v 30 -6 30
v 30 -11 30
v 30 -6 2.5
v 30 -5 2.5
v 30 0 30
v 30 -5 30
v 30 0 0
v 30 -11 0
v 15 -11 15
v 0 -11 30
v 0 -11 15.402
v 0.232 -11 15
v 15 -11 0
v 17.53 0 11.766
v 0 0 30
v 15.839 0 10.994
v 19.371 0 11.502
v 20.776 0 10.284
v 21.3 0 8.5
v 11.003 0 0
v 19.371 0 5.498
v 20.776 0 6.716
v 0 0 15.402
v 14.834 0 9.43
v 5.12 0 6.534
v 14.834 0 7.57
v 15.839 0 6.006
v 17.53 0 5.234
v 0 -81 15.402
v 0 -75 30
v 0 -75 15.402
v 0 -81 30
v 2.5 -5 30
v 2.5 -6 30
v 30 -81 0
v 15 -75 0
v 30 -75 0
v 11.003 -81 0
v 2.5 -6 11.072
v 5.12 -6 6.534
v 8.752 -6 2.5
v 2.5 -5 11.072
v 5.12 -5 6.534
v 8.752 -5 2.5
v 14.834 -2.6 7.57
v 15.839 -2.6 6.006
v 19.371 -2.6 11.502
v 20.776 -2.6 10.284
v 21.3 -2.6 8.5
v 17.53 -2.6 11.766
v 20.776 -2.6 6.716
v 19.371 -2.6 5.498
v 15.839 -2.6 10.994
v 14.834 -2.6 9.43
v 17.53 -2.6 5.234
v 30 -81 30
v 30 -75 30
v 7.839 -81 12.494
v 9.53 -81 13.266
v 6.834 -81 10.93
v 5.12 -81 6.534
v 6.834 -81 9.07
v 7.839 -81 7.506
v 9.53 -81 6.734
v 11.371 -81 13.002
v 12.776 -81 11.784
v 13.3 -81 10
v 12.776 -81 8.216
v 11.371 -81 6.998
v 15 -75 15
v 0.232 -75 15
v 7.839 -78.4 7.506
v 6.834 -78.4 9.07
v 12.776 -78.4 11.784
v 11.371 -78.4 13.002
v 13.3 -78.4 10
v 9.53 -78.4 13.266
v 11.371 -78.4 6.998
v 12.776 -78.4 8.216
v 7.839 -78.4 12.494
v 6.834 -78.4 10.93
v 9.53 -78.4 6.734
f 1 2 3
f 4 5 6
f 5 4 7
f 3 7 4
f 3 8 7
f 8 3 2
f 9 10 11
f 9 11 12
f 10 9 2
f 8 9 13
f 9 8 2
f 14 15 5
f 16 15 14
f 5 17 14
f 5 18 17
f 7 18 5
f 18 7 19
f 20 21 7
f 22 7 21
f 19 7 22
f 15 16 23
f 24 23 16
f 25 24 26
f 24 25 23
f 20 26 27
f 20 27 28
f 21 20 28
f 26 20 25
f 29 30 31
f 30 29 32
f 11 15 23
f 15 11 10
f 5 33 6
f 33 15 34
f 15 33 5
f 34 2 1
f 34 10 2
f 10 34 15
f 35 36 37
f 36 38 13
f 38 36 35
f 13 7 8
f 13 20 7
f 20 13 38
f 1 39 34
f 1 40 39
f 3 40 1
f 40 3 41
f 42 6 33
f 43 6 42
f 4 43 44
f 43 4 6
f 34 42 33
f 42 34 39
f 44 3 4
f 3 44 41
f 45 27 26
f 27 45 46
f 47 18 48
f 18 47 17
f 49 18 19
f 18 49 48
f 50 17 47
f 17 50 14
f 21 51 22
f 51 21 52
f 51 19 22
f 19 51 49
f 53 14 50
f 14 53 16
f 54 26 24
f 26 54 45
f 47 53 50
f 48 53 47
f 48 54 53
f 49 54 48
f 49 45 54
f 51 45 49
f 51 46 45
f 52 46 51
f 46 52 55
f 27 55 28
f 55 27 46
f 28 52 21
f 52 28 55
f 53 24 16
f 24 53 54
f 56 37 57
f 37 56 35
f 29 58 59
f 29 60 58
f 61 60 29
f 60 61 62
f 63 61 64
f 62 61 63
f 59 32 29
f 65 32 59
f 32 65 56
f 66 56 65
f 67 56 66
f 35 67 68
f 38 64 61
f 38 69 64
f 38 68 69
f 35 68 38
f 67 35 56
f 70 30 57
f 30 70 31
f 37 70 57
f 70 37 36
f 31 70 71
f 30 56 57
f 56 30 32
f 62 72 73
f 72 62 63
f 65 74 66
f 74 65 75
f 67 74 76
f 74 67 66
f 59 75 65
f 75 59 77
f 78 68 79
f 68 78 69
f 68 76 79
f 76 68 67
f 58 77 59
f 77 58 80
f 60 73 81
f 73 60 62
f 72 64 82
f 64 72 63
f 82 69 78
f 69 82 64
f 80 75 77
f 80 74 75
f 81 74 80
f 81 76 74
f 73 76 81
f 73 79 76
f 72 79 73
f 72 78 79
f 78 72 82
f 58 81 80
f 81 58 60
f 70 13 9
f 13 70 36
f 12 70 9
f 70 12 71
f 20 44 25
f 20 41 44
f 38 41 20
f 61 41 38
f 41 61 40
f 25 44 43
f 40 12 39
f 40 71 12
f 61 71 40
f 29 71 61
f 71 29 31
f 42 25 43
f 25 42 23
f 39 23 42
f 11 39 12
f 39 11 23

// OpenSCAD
edge=30;
slot=1;
margin=2.5;

thickness=5;
height=80;

pillar_thickness=15;
pillar_height=height-3*thickness -slot;

magnet_radius=3.3;
magnet_thickness=2.6;

rotate([90,0,0]) {
    intersection() {
    union(){
        // base with slot for metal plate
        difference() {
            cube([edge,edge, 2 * thickness + slot]);
            translate([margin,margin,thickness]) cube([edge+2,edge+1,slot]);
            
            // bottom magnet hole, uncomment to change orientation. you need two of each
            //translate([8.5, 18, -1 ]) cylinder(r=magnet_radius, h=magnet_thickness+1);
            translate([18, 8.5, -1 ]) cylinder(r=magnet_radius, h=magnet_thickness+1);
        }
        
        // pillar
        translate([0, 0, 2*thickness+slot]) cube([pillar_thickness, pillar_thickness, pillar_height]);
        
        // top with magnet hole
        difference()  {
            translate([0,0,2*thickness+slot+pillar_height]) cube([edge,edge, thickness + slot]);
            translate([10, 10, height -magnet_thickness +1 ]) cylinder(r=magnet_radius, h=magnet_thickness+1);
        }
    }
    translate([120,90,-1])cylinder(r=142,h=2*height);
}
}
